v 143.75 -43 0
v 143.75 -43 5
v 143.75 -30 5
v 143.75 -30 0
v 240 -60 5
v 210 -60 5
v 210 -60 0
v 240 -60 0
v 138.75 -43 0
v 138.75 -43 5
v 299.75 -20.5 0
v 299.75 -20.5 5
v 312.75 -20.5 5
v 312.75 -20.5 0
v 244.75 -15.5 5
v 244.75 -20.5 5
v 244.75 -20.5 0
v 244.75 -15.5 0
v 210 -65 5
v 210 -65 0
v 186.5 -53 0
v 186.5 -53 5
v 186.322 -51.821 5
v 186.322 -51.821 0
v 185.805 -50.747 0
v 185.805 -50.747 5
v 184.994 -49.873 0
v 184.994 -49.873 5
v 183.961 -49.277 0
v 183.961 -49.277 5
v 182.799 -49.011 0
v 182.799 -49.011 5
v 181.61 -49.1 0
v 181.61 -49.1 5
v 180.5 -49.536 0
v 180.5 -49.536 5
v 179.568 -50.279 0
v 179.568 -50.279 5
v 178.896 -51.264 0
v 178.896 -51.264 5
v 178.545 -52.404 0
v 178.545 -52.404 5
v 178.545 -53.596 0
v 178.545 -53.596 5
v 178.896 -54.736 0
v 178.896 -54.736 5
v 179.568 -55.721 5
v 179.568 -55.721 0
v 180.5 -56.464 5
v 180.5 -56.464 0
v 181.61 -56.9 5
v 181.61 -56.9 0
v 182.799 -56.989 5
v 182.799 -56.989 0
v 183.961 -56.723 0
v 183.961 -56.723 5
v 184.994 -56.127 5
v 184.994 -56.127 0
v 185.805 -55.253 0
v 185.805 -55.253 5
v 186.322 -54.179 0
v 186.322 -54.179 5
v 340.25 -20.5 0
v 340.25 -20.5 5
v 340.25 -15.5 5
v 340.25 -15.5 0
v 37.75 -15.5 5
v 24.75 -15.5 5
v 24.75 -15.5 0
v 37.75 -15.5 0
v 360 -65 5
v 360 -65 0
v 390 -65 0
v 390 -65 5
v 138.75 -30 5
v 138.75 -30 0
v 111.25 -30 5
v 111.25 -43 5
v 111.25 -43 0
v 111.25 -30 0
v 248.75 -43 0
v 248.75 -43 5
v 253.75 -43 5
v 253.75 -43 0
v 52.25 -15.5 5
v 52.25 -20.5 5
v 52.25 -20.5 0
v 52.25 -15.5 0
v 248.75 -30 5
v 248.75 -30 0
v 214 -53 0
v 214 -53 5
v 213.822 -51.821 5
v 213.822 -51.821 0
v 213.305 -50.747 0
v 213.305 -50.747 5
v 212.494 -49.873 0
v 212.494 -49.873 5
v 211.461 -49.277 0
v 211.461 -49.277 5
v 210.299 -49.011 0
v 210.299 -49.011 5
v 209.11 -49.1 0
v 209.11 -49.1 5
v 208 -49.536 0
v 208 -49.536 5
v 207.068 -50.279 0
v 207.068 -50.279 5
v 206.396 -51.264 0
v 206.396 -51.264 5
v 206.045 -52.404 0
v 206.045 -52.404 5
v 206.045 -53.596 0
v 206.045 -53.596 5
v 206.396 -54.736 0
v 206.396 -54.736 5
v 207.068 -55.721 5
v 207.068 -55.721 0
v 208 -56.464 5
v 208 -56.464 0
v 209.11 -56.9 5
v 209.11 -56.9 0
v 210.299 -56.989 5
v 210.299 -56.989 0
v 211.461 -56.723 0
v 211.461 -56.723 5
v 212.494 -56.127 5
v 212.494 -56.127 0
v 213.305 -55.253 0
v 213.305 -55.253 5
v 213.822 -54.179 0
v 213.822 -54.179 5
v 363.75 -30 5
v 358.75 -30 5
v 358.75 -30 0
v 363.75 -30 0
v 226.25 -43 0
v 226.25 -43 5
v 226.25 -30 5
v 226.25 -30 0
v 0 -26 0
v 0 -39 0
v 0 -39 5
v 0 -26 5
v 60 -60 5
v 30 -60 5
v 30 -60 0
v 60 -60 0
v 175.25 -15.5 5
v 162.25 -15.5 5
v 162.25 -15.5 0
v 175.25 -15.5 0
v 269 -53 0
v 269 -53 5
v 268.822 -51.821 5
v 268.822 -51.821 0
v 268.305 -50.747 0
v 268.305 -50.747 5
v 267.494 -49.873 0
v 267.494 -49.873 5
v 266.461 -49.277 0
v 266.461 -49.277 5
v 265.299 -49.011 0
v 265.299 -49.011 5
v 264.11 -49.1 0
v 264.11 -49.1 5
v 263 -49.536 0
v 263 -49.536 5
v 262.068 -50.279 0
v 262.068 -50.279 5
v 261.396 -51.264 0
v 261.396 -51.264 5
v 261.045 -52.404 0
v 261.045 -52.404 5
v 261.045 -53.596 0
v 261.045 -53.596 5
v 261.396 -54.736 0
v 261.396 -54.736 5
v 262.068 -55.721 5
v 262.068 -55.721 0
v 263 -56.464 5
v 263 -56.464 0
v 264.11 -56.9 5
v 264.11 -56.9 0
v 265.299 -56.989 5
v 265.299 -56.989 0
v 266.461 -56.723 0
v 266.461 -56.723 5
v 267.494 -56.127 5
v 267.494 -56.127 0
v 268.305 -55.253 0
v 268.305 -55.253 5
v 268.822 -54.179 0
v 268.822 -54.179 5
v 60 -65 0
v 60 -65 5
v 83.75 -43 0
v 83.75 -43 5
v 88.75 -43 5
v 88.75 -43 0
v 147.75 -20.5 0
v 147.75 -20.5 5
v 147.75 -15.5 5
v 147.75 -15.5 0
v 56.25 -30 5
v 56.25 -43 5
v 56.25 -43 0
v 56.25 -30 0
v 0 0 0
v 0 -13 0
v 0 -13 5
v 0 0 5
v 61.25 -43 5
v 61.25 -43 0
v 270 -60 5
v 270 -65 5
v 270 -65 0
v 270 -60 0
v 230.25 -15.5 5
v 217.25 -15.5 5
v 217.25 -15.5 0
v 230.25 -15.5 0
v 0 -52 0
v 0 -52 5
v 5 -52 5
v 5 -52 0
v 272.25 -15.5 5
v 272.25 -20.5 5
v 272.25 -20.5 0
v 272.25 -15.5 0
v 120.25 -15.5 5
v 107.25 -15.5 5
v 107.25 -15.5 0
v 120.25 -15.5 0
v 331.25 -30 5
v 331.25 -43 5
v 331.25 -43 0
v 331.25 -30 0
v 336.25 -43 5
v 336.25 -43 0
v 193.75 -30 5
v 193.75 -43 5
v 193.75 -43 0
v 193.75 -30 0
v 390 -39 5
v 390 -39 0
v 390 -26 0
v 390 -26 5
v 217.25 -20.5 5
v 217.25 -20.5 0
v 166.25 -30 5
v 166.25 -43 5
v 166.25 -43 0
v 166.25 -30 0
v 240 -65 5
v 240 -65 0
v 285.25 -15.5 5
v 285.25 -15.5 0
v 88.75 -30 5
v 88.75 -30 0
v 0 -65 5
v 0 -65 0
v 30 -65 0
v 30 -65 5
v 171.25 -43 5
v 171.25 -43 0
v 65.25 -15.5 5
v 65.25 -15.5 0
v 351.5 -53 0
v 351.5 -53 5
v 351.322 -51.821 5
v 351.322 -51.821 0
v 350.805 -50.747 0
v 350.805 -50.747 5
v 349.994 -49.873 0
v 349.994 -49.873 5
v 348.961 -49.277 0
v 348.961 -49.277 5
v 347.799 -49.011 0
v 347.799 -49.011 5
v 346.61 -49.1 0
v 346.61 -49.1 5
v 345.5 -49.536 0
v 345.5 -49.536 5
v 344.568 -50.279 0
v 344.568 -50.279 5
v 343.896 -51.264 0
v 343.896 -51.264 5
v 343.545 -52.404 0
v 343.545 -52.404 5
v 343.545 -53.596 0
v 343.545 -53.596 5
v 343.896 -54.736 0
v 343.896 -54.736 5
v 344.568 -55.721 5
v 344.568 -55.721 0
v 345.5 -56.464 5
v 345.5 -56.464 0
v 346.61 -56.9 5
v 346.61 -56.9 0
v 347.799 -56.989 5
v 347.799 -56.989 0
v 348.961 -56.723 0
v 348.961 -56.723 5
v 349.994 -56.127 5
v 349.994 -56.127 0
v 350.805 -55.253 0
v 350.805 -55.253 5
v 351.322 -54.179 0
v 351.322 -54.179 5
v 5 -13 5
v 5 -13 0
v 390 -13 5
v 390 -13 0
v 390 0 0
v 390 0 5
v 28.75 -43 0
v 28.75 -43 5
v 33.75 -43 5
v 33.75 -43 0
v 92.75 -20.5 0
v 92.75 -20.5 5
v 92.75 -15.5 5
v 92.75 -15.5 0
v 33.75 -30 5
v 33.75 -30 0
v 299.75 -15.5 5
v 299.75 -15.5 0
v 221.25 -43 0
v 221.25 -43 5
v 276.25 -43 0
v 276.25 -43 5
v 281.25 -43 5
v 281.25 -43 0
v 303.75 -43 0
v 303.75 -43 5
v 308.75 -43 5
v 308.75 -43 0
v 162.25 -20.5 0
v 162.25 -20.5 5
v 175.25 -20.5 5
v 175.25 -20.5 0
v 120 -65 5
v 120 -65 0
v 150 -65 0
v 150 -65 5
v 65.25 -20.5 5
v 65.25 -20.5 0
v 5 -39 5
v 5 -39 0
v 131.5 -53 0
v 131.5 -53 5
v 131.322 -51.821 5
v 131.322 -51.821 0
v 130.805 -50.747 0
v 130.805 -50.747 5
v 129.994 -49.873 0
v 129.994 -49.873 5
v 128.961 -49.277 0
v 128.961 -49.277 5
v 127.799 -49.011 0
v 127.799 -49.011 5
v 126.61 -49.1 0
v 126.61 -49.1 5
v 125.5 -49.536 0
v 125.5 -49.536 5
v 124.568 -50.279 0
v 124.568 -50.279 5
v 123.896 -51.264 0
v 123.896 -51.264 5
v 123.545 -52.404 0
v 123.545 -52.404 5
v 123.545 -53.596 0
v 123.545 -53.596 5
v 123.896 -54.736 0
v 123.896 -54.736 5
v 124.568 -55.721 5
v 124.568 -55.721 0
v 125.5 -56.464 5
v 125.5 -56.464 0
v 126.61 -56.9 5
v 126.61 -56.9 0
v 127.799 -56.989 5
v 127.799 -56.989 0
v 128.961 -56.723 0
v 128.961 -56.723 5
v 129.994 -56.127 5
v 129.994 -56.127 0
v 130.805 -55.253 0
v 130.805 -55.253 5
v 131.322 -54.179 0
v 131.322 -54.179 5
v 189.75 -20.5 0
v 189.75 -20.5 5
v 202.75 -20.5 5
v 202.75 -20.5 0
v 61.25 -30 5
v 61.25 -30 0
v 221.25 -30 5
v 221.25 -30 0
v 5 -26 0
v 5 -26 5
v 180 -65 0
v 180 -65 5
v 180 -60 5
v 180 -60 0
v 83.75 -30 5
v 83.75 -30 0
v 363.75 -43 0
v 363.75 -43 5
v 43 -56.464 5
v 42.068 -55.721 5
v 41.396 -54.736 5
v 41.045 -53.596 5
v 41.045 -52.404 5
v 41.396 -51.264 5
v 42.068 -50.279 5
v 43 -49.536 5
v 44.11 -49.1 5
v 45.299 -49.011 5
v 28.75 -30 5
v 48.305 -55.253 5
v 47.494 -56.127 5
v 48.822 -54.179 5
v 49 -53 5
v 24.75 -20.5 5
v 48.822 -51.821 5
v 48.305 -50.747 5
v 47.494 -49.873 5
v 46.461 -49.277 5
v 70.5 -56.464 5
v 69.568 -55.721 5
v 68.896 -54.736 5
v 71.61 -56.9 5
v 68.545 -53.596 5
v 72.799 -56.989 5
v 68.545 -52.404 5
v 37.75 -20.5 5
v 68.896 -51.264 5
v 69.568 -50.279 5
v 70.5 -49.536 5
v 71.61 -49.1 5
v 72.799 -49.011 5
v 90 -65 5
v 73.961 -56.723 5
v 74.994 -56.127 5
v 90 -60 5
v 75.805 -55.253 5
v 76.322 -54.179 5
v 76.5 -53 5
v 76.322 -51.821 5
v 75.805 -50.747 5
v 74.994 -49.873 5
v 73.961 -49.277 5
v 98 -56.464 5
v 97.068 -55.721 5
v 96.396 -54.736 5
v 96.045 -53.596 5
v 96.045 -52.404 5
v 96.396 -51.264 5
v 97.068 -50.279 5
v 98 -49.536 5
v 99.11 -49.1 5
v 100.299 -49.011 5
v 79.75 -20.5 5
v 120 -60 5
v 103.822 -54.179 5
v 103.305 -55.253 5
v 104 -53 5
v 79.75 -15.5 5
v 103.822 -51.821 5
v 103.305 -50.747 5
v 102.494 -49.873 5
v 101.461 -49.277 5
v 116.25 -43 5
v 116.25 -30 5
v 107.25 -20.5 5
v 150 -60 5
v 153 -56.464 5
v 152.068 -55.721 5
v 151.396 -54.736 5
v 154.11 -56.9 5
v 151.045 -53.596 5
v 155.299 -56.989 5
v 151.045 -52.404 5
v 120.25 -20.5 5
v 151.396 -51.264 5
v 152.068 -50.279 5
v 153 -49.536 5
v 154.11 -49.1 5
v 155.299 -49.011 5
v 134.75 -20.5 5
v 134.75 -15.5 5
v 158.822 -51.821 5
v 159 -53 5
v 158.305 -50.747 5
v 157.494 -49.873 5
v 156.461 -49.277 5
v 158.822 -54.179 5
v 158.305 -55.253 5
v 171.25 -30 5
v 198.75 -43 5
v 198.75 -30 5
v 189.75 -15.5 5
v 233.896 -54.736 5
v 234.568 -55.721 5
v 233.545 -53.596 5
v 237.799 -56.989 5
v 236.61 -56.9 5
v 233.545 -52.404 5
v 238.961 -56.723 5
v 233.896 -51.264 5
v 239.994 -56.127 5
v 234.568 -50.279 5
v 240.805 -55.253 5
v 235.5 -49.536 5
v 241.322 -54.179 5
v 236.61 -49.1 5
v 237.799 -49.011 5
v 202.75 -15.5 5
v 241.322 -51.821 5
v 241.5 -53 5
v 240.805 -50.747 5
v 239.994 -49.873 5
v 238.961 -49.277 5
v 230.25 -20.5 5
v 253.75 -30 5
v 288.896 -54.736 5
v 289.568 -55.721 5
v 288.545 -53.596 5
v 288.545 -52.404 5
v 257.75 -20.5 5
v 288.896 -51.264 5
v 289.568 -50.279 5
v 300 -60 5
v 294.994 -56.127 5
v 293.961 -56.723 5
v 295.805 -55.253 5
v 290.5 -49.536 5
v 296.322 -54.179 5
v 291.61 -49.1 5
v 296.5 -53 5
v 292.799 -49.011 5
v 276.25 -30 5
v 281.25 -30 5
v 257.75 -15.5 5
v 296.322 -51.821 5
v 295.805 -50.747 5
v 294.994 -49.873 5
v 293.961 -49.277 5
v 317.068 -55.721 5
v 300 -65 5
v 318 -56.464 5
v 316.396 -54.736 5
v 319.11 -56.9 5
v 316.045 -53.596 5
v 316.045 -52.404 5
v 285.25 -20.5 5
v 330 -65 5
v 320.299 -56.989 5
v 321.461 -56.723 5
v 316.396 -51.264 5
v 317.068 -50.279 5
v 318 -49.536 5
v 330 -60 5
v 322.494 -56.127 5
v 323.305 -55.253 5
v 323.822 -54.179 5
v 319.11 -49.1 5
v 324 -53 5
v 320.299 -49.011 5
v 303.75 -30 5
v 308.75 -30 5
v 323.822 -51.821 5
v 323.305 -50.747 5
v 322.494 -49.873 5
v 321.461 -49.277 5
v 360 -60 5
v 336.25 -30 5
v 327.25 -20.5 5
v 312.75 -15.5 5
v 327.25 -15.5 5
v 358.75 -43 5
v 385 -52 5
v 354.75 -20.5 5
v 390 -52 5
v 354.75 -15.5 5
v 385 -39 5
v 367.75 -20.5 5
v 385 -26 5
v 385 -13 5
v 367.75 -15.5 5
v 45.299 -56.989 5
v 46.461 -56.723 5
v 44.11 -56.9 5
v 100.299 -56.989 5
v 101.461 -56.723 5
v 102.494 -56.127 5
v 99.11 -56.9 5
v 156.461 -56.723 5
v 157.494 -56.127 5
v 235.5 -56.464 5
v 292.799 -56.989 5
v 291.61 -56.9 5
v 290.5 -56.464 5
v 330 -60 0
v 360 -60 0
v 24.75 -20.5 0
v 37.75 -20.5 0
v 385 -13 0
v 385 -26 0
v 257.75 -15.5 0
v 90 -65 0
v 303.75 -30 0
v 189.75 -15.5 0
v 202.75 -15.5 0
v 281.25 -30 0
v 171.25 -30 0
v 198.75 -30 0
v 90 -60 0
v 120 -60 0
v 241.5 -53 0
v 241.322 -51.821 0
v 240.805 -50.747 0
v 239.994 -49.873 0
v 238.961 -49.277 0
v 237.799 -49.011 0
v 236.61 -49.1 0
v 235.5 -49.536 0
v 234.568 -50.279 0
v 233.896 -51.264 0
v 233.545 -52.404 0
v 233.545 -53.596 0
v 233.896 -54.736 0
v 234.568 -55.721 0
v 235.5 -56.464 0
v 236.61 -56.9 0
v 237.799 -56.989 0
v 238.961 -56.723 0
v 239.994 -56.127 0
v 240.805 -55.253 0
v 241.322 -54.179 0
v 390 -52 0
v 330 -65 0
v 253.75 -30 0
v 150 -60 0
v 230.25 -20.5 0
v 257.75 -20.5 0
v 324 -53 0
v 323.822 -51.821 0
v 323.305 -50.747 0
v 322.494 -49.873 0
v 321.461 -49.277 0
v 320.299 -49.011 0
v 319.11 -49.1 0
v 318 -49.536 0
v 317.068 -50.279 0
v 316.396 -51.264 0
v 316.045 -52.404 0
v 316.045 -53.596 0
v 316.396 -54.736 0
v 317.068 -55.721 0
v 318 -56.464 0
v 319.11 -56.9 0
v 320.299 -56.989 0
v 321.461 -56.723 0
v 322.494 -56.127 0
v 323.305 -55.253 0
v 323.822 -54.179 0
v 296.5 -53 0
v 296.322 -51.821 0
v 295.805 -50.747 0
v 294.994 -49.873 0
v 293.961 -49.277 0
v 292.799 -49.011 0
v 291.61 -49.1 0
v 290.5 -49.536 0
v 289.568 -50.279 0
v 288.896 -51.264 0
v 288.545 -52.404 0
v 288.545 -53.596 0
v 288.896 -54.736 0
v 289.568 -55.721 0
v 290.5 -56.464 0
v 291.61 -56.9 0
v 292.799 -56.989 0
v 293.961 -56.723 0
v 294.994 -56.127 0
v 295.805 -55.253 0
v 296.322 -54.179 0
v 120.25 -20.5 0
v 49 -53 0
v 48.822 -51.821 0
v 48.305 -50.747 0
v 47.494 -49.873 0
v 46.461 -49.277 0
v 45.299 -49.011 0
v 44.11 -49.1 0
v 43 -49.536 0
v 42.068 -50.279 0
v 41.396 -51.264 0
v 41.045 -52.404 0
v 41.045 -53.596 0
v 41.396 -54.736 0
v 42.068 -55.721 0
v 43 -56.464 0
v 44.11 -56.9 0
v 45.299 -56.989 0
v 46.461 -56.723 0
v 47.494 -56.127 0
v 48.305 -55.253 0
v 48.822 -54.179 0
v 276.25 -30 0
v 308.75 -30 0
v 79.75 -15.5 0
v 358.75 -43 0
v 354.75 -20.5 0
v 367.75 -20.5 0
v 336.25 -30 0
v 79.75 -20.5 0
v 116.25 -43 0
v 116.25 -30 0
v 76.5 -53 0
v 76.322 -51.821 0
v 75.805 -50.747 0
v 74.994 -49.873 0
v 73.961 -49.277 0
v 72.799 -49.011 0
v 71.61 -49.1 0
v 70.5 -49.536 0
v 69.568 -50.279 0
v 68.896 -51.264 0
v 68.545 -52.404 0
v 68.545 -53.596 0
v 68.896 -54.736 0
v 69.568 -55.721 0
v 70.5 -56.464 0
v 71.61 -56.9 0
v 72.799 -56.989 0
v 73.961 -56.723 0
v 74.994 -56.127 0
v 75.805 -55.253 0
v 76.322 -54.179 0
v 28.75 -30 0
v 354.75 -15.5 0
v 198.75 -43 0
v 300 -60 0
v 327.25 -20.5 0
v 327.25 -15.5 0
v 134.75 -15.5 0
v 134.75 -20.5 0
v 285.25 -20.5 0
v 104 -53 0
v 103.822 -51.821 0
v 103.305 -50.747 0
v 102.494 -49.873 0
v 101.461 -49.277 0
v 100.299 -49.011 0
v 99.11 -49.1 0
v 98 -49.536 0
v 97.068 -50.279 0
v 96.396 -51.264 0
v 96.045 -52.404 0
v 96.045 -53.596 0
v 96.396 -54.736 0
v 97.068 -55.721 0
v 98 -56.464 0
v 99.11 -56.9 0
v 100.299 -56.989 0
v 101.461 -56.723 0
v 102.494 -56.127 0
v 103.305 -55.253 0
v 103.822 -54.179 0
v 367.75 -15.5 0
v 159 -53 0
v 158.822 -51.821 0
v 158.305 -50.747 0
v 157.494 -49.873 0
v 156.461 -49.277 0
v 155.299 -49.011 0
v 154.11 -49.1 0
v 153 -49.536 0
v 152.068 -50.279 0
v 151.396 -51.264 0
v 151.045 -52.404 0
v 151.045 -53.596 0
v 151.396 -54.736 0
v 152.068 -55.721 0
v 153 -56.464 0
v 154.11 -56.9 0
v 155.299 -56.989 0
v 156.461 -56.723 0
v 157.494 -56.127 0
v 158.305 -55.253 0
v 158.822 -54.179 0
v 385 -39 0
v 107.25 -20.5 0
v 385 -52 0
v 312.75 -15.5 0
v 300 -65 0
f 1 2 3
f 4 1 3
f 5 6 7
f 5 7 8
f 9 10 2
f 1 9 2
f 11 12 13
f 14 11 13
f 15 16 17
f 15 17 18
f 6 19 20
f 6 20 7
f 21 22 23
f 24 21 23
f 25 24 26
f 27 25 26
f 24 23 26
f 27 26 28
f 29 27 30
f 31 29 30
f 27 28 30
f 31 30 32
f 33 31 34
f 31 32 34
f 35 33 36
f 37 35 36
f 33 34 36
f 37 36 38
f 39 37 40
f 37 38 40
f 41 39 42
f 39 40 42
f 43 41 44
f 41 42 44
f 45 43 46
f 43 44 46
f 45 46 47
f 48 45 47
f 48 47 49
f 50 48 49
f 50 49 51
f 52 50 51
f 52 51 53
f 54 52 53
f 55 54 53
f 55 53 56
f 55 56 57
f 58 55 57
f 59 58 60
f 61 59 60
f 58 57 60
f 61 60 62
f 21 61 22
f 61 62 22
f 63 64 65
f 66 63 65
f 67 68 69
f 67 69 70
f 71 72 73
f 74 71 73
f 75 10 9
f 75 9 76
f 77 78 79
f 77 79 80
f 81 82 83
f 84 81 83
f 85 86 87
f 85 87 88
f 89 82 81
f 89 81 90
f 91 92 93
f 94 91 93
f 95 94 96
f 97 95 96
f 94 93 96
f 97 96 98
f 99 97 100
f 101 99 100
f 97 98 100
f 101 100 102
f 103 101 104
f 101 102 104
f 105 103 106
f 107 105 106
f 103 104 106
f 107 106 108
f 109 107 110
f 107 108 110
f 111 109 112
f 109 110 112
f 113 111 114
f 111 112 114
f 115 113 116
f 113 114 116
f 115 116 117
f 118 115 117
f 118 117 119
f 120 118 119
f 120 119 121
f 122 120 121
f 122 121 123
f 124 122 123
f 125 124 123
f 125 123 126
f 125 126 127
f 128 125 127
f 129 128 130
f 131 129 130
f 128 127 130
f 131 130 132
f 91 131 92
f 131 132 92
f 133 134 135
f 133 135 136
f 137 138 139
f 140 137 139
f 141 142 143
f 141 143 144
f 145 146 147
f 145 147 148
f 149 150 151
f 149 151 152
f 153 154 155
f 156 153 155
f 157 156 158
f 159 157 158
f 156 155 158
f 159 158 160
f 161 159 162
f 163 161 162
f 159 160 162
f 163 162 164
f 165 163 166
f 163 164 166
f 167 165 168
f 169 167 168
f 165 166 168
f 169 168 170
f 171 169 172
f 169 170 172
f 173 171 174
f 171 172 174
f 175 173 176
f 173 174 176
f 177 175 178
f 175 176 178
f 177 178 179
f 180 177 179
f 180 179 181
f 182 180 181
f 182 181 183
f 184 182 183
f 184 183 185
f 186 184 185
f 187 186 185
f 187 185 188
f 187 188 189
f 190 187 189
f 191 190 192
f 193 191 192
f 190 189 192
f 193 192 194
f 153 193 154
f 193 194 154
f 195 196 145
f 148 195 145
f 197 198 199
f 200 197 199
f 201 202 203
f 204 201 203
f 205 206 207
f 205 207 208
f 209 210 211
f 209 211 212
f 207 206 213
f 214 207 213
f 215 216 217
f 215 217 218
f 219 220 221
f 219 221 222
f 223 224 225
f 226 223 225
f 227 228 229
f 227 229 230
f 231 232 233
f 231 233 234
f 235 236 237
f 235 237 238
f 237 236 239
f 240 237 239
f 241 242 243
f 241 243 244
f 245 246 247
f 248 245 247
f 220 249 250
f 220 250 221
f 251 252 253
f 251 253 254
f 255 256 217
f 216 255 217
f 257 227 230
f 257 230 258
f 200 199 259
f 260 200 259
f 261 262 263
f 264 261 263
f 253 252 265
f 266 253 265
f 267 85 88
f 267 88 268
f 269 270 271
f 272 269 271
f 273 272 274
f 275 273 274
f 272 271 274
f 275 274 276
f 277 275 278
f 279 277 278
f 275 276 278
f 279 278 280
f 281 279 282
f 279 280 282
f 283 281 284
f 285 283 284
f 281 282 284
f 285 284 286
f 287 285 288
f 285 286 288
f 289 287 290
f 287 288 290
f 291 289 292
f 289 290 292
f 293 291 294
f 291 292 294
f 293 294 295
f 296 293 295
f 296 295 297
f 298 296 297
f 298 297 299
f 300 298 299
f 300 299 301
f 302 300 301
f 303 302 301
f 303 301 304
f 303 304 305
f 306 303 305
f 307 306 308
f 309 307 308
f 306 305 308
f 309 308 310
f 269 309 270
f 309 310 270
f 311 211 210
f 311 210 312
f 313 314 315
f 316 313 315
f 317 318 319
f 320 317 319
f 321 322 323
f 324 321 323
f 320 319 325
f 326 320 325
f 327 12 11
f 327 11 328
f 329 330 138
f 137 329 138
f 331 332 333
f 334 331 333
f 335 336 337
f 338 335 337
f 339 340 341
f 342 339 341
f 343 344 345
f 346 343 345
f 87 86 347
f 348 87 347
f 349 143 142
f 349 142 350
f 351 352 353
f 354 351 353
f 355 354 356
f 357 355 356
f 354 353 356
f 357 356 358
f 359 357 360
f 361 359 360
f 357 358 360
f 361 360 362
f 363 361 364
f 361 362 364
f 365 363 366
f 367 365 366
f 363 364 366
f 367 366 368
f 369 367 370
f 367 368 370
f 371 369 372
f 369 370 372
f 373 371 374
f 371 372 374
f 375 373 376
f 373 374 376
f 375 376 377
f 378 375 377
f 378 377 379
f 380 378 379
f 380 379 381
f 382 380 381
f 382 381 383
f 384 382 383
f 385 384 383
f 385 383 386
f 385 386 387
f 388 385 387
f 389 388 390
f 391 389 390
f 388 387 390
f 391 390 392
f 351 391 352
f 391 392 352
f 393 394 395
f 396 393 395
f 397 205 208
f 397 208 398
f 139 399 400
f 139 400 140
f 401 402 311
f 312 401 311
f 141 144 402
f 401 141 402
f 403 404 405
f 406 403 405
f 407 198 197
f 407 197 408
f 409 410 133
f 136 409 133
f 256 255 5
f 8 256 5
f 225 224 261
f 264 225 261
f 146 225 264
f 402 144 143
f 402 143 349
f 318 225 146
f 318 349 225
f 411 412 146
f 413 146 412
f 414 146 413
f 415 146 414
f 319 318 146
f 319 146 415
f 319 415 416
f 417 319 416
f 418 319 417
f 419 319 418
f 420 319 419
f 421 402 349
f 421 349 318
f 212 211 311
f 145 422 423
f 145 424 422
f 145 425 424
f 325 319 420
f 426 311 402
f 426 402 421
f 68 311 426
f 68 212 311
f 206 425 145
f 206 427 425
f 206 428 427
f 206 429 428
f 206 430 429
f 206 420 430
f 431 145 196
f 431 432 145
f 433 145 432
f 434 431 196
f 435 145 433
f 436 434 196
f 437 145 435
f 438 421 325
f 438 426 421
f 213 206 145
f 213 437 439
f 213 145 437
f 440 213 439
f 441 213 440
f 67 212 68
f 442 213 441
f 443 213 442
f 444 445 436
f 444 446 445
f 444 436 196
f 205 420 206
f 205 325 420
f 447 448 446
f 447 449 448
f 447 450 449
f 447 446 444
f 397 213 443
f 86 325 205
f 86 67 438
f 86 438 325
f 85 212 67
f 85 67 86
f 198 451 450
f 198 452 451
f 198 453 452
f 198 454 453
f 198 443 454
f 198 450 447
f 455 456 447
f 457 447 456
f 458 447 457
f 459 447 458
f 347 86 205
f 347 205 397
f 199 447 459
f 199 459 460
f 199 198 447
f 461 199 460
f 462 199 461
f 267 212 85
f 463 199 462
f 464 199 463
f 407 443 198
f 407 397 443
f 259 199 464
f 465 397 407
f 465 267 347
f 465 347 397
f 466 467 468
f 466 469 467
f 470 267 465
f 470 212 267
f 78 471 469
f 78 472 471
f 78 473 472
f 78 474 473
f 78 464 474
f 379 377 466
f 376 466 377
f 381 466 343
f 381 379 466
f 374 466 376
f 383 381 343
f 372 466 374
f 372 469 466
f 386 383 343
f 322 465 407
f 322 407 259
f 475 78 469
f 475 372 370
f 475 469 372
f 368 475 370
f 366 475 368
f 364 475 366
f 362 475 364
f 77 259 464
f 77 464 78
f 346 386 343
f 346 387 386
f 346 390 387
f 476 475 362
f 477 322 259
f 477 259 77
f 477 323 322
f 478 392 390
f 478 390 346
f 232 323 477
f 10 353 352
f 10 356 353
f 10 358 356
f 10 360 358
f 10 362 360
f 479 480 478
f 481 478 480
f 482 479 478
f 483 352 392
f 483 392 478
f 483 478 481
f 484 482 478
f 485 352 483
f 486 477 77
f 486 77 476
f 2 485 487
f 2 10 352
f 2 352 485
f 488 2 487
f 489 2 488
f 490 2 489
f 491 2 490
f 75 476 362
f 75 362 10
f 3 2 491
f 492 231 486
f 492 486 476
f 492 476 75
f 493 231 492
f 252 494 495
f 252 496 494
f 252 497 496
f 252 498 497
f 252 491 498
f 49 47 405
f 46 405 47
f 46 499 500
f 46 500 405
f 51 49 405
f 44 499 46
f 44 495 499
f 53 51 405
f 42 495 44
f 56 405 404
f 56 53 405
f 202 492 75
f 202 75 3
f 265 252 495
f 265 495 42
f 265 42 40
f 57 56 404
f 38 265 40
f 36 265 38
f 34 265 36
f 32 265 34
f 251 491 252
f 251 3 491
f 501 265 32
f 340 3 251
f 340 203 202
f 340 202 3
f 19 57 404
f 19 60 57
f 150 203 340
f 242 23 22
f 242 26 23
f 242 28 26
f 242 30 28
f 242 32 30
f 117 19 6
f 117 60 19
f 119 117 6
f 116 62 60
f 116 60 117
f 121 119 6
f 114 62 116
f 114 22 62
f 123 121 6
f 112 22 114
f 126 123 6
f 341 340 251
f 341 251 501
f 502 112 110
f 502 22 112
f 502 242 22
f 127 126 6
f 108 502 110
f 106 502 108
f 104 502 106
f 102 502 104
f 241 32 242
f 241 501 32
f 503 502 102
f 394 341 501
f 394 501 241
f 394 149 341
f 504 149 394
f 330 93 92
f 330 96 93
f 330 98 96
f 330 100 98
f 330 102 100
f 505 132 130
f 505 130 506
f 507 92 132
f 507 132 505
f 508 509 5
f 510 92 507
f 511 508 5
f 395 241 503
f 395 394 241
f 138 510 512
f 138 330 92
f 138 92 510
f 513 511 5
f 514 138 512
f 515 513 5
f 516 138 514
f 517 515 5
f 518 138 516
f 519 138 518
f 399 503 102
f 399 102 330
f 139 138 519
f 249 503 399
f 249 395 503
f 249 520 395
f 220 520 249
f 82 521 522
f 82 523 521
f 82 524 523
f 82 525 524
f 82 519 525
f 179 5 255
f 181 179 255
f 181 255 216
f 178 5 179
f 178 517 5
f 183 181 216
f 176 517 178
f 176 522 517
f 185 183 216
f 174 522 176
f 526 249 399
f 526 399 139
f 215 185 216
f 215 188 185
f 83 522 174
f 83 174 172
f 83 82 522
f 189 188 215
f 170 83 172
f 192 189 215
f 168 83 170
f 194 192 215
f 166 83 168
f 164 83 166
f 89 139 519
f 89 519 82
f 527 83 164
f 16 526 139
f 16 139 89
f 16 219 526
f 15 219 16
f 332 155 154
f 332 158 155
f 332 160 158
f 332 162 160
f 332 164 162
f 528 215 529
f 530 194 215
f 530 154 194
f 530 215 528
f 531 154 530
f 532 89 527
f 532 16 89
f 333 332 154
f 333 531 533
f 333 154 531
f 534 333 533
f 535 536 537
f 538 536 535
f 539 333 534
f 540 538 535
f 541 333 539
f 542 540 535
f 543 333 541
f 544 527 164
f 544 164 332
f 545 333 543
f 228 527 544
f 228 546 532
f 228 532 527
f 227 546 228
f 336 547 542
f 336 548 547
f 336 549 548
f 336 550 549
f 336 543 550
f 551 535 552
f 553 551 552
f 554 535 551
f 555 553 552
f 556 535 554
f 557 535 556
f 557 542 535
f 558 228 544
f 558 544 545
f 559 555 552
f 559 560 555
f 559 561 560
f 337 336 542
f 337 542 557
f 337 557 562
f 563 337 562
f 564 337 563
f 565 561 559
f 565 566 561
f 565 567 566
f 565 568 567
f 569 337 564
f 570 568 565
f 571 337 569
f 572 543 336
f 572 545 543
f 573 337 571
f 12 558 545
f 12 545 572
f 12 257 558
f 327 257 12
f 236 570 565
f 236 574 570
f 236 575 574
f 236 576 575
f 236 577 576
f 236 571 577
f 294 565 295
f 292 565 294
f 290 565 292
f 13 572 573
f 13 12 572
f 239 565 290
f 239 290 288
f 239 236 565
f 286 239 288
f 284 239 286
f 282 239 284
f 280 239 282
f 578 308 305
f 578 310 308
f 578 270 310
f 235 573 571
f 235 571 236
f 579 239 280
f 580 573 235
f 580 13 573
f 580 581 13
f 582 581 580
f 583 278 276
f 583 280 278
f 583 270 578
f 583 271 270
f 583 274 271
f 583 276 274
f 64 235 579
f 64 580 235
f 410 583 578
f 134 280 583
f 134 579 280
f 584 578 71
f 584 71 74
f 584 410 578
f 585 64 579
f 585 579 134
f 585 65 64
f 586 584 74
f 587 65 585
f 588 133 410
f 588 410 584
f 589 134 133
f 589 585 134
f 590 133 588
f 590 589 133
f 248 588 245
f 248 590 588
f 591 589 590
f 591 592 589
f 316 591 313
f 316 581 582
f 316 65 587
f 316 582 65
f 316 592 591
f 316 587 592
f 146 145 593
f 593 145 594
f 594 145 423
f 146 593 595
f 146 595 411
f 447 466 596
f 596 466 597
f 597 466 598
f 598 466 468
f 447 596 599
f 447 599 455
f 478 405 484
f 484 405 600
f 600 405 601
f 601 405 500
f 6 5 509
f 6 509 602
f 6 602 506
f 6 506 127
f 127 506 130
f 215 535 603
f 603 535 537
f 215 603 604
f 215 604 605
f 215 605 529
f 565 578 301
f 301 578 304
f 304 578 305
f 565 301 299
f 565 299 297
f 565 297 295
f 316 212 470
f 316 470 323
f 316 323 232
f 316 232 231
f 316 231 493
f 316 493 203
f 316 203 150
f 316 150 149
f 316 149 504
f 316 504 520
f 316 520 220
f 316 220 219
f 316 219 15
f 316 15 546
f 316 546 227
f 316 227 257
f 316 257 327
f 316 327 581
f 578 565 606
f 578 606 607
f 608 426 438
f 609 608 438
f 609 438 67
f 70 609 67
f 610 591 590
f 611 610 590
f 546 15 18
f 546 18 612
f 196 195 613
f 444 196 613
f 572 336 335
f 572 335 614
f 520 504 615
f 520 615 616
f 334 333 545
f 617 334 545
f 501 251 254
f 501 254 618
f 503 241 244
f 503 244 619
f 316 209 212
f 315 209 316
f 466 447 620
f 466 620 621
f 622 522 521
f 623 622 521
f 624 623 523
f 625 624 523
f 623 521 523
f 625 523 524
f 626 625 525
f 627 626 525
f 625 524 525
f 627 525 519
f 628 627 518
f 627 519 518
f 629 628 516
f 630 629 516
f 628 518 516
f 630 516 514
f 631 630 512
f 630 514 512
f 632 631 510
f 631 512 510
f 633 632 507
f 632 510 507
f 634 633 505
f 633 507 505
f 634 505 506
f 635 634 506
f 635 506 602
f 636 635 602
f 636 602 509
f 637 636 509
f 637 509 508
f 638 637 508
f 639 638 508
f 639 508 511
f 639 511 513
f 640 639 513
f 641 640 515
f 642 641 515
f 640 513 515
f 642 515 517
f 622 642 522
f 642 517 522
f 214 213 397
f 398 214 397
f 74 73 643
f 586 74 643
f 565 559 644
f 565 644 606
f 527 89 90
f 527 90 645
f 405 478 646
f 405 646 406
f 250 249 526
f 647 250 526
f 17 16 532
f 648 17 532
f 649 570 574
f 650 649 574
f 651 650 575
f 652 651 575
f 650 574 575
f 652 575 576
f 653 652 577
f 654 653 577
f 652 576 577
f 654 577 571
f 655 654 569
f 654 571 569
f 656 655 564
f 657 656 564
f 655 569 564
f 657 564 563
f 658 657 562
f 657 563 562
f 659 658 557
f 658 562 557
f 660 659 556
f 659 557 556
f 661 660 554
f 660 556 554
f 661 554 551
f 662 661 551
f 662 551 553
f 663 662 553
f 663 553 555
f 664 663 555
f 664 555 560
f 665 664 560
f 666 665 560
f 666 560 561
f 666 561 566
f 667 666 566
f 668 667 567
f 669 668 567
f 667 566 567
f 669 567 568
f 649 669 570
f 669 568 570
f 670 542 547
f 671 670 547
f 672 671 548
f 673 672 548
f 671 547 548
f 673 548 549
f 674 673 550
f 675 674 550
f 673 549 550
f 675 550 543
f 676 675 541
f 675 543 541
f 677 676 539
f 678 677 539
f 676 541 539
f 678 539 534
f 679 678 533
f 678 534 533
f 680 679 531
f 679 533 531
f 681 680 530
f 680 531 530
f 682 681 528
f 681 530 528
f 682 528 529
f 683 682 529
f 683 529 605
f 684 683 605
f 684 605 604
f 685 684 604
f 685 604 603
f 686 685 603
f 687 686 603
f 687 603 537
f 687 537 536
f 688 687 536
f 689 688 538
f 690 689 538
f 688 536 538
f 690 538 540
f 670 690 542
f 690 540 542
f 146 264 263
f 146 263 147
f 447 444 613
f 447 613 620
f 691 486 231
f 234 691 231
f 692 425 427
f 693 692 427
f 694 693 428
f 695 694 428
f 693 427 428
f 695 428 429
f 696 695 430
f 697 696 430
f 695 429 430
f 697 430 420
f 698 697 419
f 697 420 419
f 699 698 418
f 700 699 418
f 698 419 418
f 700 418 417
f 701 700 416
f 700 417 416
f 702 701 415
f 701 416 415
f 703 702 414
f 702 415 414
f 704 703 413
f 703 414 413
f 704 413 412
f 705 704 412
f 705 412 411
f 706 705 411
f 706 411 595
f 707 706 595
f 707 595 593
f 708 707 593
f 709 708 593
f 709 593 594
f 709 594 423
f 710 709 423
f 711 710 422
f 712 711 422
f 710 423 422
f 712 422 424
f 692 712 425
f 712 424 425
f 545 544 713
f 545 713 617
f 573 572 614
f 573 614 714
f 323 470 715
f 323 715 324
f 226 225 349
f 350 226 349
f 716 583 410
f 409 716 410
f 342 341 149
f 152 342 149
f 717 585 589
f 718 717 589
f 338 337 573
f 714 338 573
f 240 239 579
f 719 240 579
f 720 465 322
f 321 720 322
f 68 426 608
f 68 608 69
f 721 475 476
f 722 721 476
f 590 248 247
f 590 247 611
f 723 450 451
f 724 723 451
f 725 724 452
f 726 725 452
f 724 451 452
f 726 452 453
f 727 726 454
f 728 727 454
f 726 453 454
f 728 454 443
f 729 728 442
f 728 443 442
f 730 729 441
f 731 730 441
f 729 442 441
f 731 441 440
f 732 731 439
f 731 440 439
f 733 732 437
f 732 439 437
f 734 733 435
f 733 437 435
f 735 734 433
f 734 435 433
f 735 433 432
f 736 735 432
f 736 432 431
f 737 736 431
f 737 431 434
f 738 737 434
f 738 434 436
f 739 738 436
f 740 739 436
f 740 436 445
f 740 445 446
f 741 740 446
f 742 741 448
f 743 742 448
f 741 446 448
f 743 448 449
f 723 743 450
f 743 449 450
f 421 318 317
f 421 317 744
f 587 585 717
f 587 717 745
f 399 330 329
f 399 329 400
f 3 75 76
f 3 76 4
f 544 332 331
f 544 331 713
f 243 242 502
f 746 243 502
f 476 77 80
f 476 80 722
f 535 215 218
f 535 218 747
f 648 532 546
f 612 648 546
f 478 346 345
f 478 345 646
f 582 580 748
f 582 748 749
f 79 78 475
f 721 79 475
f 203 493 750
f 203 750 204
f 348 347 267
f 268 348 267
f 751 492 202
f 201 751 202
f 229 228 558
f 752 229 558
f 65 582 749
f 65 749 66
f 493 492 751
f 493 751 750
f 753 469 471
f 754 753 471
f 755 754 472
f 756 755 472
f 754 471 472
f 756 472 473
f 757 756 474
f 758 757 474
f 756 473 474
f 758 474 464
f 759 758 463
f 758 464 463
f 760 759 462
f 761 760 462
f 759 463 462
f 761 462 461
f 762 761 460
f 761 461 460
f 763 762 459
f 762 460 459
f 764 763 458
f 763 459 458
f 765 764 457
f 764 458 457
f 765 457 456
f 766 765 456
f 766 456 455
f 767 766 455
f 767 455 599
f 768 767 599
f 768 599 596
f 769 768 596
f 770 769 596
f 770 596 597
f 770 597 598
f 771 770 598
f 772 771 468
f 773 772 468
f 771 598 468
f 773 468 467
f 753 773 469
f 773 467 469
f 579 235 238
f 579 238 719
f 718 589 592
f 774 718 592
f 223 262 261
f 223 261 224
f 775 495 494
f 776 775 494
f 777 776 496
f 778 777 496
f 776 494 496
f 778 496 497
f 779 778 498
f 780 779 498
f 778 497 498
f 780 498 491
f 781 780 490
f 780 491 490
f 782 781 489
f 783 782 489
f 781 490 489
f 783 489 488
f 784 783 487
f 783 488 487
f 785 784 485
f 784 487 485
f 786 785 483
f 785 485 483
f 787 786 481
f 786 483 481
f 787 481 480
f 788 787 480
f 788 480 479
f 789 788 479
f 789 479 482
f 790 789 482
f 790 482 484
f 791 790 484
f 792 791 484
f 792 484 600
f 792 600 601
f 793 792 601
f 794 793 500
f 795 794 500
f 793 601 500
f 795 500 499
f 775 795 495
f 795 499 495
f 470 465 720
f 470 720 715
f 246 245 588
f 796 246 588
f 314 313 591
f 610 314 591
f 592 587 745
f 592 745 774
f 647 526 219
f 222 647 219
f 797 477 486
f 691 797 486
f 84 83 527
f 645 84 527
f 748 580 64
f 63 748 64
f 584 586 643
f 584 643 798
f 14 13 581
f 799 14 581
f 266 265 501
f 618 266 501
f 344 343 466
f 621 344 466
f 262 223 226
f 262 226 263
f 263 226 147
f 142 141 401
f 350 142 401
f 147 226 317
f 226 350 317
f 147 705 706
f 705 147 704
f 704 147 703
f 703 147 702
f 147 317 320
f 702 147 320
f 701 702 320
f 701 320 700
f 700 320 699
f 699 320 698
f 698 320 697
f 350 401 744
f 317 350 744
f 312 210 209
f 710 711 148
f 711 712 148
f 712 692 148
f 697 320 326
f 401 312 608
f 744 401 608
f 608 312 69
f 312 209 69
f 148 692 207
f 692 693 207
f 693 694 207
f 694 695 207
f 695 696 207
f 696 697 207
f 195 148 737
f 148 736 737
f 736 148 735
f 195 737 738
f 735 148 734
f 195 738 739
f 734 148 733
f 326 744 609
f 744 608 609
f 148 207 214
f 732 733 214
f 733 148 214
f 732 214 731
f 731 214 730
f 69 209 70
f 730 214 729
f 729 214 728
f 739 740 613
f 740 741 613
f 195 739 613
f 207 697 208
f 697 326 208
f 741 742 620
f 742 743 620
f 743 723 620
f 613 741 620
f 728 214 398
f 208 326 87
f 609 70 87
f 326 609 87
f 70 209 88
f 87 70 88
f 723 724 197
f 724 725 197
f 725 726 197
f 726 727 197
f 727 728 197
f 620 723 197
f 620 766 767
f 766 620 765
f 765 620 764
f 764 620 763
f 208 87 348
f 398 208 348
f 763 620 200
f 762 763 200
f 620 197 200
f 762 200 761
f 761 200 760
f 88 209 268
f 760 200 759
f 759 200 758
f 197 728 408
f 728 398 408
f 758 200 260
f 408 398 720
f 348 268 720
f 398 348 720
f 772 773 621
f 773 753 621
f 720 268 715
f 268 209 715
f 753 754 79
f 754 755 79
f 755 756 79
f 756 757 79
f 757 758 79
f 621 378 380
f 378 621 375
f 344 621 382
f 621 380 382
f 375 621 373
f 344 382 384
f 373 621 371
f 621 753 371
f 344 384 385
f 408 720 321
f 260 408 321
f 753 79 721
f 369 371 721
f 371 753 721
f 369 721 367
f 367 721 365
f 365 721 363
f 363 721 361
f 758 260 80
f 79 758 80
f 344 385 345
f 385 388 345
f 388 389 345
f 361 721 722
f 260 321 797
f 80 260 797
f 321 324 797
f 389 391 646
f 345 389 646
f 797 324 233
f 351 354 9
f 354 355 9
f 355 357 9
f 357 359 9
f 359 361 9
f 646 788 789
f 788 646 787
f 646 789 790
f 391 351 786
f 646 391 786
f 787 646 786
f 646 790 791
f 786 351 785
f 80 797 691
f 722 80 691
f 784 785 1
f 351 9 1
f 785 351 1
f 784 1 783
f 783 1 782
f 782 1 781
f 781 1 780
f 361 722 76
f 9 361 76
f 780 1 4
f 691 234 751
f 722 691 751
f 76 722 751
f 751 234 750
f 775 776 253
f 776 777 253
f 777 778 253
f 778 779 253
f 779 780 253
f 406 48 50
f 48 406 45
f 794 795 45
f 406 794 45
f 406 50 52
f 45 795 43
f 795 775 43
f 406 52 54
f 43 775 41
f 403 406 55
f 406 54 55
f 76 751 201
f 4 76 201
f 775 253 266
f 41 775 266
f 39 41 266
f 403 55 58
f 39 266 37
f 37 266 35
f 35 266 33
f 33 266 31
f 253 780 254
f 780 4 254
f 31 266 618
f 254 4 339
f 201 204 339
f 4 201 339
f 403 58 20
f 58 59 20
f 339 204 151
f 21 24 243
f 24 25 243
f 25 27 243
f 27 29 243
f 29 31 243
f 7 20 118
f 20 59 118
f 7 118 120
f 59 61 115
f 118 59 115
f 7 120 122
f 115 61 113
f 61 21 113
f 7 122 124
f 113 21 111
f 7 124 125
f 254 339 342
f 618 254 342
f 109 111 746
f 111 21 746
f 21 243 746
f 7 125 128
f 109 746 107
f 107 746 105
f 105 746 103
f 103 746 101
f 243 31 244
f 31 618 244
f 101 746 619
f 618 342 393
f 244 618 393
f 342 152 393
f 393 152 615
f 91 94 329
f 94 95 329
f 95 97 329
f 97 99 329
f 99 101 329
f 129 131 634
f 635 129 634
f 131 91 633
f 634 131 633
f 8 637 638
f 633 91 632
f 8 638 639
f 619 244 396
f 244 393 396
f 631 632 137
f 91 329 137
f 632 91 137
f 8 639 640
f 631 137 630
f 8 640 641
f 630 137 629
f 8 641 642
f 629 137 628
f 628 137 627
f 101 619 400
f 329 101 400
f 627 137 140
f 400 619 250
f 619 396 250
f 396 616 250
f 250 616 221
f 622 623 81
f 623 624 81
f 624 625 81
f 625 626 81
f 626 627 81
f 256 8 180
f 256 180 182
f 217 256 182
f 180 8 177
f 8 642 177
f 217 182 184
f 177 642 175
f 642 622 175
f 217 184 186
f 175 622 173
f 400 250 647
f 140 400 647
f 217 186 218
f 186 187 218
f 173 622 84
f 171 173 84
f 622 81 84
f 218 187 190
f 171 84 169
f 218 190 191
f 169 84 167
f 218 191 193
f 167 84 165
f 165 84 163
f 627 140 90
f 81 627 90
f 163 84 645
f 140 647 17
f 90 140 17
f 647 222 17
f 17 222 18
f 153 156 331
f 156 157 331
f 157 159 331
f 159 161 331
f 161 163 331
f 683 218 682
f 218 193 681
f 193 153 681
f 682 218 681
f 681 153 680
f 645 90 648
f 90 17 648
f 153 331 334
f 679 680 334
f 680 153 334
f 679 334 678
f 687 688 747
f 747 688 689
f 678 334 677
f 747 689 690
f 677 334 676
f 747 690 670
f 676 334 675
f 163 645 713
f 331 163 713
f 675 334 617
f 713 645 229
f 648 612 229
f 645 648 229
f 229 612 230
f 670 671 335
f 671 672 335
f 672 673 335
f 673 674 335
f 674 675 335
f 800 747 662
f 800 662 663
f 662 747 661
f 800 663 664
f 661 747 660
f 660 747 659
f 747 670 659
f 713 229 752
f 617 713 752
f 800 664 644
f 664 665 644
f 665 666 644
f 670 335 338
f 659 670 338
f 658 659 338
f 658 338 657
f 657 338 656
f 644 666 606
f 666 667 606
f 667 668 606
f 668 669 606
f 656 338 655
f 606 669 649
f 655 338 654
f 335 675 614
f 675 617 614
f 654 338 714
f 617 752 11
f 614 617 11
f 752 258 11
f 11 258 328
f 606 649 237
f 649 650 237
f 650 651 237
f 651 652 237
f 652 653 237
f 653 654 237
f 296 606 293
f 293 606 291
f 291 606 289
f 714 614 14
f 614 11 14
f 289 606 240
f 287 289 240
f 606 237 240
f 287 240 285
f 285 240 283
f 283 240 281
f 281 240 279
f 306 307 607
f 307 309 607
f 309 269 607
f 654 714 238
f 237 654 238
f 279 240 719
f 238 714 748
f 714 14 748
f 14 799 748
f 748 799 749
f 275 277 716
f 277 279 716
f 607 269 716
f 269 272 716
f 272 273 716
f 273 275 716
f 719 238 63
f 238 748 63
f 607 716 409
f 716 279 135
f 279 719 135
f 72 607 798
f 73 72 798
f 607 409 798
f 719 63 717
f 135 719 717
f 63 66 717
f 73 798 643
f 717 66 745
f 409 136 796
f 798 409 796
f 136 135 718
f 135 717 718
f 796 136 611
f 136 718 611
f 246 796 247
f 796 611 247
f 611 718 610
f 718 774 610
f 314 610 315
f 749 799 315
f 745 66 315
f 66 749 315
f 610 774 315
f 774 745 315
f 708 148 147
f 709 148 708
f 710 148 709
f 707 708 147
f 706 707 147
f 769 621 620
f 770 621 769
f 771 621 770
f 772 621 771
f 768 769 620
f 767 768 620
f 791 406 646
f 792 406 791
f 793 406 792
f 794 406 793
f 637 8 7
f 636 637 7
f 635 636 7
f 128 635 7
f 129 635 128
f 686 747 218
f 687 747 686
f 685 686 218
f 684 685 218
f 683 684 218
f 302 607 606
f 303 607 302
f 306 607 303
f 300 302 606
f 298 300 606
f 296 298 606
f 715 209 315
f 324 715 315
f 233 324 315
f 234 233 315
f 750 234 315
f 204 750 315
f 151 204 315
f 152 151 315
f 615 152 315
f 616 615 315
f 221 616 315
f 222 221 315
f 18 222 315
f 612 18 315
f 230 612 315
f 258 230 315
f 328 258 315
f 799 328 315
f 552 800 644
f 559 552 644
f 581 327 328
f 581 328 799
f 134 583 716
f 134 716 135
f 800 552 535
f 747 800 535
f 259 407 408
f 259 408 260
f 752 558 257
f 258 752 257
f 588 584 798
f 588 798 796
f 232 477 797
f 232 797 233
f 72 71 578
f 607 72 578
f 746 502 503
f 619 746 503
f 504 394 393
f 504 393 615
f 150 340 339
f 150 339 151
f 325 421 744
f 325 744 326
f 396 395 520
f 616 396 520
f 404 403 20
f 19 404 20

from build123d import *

# Parameters (mm, degrees)
ESQUISSE1_W                    = 390
ESQUISSE1_H                    = 65
BOSS_EXTRU_1_DEPTH             = 5
ESQUISSE2_W                    = 30
ESQUISSE2_H                    = 5
ENL_V_MAT_EXTRU_1_DEPTH        = 5
R_P_TITION_LIN_AIRE1_COUNT     = 6
R_P_TITION_LIN_AIRE1_PITCH     = 60
ESQUISSE3_W                    = 5
ESQUISSE3_H                    = 13
ENL_V_MAT_EXTRU_2_DEPTH        = 5
R_P_TITION_LIN_AIRE2_COUNT     = 2
R_P_TITION_LIN_AIRE2_PITCH     = 26
SYM_TRIE1_COPY_1_SKETCH_W      = 5
SYM_TRIE1_COPY_1_SKETCH_H      = 13
SYM_TRIE1_COPY_1_DEPTH         = 5
ESQUISSE4_R                    = 4
ENL_V_MAT_EXTRU_3_DEPTH        = 5
R_P_TITION_LIN_AIRE3_COUNT     = 10
R_P_TITION_LIN_AIRE3_PITCH     = 27.5
R_P_TITION_LIN_AIRE3_COL_COUNT = 3
R_P_TITION_LIN_AIRE3_COL_PITCH = 27.5
ESQUISSE5_W                    = 5
ESQUISSE5_H                    = 13
ESQUISSE5_W_2                  = 13
ESQUISSE5_H_2                  = 5
ENL_V_MAT_EXTRU_4_DEPTH        = 5
R_P_TITION_LIN_AIRE4_COUNT     = 3
R_P_TITION_LIN_AIRE4_PITCH     = 27.5
R_P_TITION_LIN_AIRE4_COL_COUNT = 11
R_P_TITION_LIN_AIRE4_COL_PITCH = 27.5


with BuildPart() as part:
    # Esquisse1 → Boss.-Extru.1 (new body)
    with BuildSketch(Plane.XY):
        with Locations((195, -32.5)):
            Rectangle(ESQUISSE1_W, ESQUISSE1_H)
    extrude(amount=BOSS_EXTRU_1_DEPTH)

    # Esquisse2 → Enlèv. mat.-Extru.1 (cut)
    with BuildSketch(Plane.XY.offset(5)):
        with Locations((45, -62.5)):
            Rectangle(ESQUISSE2_W, ESQUISSE2_H)
    enl_v_mat_extru_1 = extrude(amount=-ENL_V_MAT_EXTRU_1_DEPTH, mode=Mode.SUBTRACT)

    # Répétition linéaire1: Enlèv. mat.-Extru.1 ×6
    with Locations(*[(i * R_P_TITION_LIN_AIRE1_PITCH, 0, 0) for i in range(1, R_P_TITION_LIN_AIRE1_COUNT)]):
        add(enl_v_mat_extru_1, mode=Mode.SUBTRACT)

    # Esquisse3 → Enlèv. mat.-Extru.2 (cut)
    with BuildSketch(Plane.XY.offset(5)):
        with Locations((2.5, -45.5)):
            Rectangle(ESQUISSE3_W, ESQUISSE3_H)
    enl_v_mat_extru_2 = extrude(amount=-ENL_V_MAT_EXTRU_2_DEPTH, mode=Mode.SUBTRACT)

    # Répétition linéaire2: Enlèv. mat.-Extru.2 ×2
    with Locations(*[(0, i * R_P_TITION_LIN_AIRE2_PITCH, 0) for i in range(1, R_P_TITION_LIN_AIRE2_COUNT)]):
        add(enl_v_mat_extru_2, mode=Mode.SUBTRACT)

    # Symétrie1: Enlèv. mat.-Extru.2 across plane
    add(enl_v_mat_extru_2.mirror(Plane.ZY.offset(-195)), mode=Mode.SUBTRACT)

    # Symétrie1 copy 1 sketch → Symétrie1 copy 1 (cut)
    with BuildSketch(Plane(origin=(390, 26, 5), x_dir=(-1, 0, 0), z_dir=(0, 0, 1))):
        with Locations((2.5, 45.5)):
            Rectangle(SYM_TRIE1_COPY_1_SKETCH_W, SYM_TRIE1_COPY_1_SKETCH_H)
    extrude(amount=-SYM_TRIE1_COPY_1_DEPTH, mode=Mode.SUBTRACT)

    # Esquisse4 → Enlèv. mat.-Extru.3 (cut)
    with BuildSketch(Plane.XY.offset(5)):
        with Locations((100, -53)):
            Circle(ESQUISSE4_R)
    enl_v_mat_extru_3 = extrude(amount=-ENL_V_MAT_EXTRU_3_DEPTH, mode=Mode.SUBTRACT)

    # Répétition linéaire3: Enlèv. mat.-Extru.3 ×10
    with Locations(*[(i * R_P_TITION_LIN_AIRE3_PITCH, 0, 0) for i in range(1, R_P_TITION_LIN_AIRE3_COUNT)]):
        add(enl_v_mat_extru_3, mode=Mode.SUBTRACT)

    # Répétition linéaire3 col: Enlèv. mat.-Extru.3 ×3
    with Locations(*[(-i * R_P_TITION_LIN_AIRE3_COL_PITCH, 0, 0) for i in range(1, R_P_TITION_LIN_AIRE3_COL_COUNT)]):
        add(enl_v_mat_extru_3, mode=Mode.SUBTRACT)

    # Esquisse5 → Enlèv. mat.-Extru.4 (cut)
    with BuildSketch(Plane.XY.offset(5)):
        with Locations((86.25, -36.5)):
            Rectangle(ESQUISSE5_W, ESQUISSE5_H)
        with Locations((86.25, -18)):
            Rectangle(ESQUISSE5_W_2, ESQUISSE5_H_2)
    enl_v_mat_extru_4 = extrude(amount=-ENL_V_MAT_EXTRU_4_DEPTH, mode=Mode.SUBTRACT)

    # Répétition linéaire4: Enlèv. mat.-Extru.4 ×3
    with Locations(*[(-i * R_P_TITION_LIN_AIRE4_PITCH, 0, 0) for i in range(1, R_P_TITION_LIN_AIRE4_COUNT)]):
        add(enl_v_mat_extru_4, mode=Mode.SUBTRACT)

    # Répétition linéaire4 col: Enlèv. mat.-Extru.4 ×11
    with Locations(*[(i * R_P_TITION_LIN_AIRE4_COL_PITCH, 0, 0) for i in range(1, R_P_TITION_LIN_AIRE4_COL_COUNT)]):
        add(enl_v_mat_extru_4, mode=Mode.SUBTRACT)


solid = part.part
